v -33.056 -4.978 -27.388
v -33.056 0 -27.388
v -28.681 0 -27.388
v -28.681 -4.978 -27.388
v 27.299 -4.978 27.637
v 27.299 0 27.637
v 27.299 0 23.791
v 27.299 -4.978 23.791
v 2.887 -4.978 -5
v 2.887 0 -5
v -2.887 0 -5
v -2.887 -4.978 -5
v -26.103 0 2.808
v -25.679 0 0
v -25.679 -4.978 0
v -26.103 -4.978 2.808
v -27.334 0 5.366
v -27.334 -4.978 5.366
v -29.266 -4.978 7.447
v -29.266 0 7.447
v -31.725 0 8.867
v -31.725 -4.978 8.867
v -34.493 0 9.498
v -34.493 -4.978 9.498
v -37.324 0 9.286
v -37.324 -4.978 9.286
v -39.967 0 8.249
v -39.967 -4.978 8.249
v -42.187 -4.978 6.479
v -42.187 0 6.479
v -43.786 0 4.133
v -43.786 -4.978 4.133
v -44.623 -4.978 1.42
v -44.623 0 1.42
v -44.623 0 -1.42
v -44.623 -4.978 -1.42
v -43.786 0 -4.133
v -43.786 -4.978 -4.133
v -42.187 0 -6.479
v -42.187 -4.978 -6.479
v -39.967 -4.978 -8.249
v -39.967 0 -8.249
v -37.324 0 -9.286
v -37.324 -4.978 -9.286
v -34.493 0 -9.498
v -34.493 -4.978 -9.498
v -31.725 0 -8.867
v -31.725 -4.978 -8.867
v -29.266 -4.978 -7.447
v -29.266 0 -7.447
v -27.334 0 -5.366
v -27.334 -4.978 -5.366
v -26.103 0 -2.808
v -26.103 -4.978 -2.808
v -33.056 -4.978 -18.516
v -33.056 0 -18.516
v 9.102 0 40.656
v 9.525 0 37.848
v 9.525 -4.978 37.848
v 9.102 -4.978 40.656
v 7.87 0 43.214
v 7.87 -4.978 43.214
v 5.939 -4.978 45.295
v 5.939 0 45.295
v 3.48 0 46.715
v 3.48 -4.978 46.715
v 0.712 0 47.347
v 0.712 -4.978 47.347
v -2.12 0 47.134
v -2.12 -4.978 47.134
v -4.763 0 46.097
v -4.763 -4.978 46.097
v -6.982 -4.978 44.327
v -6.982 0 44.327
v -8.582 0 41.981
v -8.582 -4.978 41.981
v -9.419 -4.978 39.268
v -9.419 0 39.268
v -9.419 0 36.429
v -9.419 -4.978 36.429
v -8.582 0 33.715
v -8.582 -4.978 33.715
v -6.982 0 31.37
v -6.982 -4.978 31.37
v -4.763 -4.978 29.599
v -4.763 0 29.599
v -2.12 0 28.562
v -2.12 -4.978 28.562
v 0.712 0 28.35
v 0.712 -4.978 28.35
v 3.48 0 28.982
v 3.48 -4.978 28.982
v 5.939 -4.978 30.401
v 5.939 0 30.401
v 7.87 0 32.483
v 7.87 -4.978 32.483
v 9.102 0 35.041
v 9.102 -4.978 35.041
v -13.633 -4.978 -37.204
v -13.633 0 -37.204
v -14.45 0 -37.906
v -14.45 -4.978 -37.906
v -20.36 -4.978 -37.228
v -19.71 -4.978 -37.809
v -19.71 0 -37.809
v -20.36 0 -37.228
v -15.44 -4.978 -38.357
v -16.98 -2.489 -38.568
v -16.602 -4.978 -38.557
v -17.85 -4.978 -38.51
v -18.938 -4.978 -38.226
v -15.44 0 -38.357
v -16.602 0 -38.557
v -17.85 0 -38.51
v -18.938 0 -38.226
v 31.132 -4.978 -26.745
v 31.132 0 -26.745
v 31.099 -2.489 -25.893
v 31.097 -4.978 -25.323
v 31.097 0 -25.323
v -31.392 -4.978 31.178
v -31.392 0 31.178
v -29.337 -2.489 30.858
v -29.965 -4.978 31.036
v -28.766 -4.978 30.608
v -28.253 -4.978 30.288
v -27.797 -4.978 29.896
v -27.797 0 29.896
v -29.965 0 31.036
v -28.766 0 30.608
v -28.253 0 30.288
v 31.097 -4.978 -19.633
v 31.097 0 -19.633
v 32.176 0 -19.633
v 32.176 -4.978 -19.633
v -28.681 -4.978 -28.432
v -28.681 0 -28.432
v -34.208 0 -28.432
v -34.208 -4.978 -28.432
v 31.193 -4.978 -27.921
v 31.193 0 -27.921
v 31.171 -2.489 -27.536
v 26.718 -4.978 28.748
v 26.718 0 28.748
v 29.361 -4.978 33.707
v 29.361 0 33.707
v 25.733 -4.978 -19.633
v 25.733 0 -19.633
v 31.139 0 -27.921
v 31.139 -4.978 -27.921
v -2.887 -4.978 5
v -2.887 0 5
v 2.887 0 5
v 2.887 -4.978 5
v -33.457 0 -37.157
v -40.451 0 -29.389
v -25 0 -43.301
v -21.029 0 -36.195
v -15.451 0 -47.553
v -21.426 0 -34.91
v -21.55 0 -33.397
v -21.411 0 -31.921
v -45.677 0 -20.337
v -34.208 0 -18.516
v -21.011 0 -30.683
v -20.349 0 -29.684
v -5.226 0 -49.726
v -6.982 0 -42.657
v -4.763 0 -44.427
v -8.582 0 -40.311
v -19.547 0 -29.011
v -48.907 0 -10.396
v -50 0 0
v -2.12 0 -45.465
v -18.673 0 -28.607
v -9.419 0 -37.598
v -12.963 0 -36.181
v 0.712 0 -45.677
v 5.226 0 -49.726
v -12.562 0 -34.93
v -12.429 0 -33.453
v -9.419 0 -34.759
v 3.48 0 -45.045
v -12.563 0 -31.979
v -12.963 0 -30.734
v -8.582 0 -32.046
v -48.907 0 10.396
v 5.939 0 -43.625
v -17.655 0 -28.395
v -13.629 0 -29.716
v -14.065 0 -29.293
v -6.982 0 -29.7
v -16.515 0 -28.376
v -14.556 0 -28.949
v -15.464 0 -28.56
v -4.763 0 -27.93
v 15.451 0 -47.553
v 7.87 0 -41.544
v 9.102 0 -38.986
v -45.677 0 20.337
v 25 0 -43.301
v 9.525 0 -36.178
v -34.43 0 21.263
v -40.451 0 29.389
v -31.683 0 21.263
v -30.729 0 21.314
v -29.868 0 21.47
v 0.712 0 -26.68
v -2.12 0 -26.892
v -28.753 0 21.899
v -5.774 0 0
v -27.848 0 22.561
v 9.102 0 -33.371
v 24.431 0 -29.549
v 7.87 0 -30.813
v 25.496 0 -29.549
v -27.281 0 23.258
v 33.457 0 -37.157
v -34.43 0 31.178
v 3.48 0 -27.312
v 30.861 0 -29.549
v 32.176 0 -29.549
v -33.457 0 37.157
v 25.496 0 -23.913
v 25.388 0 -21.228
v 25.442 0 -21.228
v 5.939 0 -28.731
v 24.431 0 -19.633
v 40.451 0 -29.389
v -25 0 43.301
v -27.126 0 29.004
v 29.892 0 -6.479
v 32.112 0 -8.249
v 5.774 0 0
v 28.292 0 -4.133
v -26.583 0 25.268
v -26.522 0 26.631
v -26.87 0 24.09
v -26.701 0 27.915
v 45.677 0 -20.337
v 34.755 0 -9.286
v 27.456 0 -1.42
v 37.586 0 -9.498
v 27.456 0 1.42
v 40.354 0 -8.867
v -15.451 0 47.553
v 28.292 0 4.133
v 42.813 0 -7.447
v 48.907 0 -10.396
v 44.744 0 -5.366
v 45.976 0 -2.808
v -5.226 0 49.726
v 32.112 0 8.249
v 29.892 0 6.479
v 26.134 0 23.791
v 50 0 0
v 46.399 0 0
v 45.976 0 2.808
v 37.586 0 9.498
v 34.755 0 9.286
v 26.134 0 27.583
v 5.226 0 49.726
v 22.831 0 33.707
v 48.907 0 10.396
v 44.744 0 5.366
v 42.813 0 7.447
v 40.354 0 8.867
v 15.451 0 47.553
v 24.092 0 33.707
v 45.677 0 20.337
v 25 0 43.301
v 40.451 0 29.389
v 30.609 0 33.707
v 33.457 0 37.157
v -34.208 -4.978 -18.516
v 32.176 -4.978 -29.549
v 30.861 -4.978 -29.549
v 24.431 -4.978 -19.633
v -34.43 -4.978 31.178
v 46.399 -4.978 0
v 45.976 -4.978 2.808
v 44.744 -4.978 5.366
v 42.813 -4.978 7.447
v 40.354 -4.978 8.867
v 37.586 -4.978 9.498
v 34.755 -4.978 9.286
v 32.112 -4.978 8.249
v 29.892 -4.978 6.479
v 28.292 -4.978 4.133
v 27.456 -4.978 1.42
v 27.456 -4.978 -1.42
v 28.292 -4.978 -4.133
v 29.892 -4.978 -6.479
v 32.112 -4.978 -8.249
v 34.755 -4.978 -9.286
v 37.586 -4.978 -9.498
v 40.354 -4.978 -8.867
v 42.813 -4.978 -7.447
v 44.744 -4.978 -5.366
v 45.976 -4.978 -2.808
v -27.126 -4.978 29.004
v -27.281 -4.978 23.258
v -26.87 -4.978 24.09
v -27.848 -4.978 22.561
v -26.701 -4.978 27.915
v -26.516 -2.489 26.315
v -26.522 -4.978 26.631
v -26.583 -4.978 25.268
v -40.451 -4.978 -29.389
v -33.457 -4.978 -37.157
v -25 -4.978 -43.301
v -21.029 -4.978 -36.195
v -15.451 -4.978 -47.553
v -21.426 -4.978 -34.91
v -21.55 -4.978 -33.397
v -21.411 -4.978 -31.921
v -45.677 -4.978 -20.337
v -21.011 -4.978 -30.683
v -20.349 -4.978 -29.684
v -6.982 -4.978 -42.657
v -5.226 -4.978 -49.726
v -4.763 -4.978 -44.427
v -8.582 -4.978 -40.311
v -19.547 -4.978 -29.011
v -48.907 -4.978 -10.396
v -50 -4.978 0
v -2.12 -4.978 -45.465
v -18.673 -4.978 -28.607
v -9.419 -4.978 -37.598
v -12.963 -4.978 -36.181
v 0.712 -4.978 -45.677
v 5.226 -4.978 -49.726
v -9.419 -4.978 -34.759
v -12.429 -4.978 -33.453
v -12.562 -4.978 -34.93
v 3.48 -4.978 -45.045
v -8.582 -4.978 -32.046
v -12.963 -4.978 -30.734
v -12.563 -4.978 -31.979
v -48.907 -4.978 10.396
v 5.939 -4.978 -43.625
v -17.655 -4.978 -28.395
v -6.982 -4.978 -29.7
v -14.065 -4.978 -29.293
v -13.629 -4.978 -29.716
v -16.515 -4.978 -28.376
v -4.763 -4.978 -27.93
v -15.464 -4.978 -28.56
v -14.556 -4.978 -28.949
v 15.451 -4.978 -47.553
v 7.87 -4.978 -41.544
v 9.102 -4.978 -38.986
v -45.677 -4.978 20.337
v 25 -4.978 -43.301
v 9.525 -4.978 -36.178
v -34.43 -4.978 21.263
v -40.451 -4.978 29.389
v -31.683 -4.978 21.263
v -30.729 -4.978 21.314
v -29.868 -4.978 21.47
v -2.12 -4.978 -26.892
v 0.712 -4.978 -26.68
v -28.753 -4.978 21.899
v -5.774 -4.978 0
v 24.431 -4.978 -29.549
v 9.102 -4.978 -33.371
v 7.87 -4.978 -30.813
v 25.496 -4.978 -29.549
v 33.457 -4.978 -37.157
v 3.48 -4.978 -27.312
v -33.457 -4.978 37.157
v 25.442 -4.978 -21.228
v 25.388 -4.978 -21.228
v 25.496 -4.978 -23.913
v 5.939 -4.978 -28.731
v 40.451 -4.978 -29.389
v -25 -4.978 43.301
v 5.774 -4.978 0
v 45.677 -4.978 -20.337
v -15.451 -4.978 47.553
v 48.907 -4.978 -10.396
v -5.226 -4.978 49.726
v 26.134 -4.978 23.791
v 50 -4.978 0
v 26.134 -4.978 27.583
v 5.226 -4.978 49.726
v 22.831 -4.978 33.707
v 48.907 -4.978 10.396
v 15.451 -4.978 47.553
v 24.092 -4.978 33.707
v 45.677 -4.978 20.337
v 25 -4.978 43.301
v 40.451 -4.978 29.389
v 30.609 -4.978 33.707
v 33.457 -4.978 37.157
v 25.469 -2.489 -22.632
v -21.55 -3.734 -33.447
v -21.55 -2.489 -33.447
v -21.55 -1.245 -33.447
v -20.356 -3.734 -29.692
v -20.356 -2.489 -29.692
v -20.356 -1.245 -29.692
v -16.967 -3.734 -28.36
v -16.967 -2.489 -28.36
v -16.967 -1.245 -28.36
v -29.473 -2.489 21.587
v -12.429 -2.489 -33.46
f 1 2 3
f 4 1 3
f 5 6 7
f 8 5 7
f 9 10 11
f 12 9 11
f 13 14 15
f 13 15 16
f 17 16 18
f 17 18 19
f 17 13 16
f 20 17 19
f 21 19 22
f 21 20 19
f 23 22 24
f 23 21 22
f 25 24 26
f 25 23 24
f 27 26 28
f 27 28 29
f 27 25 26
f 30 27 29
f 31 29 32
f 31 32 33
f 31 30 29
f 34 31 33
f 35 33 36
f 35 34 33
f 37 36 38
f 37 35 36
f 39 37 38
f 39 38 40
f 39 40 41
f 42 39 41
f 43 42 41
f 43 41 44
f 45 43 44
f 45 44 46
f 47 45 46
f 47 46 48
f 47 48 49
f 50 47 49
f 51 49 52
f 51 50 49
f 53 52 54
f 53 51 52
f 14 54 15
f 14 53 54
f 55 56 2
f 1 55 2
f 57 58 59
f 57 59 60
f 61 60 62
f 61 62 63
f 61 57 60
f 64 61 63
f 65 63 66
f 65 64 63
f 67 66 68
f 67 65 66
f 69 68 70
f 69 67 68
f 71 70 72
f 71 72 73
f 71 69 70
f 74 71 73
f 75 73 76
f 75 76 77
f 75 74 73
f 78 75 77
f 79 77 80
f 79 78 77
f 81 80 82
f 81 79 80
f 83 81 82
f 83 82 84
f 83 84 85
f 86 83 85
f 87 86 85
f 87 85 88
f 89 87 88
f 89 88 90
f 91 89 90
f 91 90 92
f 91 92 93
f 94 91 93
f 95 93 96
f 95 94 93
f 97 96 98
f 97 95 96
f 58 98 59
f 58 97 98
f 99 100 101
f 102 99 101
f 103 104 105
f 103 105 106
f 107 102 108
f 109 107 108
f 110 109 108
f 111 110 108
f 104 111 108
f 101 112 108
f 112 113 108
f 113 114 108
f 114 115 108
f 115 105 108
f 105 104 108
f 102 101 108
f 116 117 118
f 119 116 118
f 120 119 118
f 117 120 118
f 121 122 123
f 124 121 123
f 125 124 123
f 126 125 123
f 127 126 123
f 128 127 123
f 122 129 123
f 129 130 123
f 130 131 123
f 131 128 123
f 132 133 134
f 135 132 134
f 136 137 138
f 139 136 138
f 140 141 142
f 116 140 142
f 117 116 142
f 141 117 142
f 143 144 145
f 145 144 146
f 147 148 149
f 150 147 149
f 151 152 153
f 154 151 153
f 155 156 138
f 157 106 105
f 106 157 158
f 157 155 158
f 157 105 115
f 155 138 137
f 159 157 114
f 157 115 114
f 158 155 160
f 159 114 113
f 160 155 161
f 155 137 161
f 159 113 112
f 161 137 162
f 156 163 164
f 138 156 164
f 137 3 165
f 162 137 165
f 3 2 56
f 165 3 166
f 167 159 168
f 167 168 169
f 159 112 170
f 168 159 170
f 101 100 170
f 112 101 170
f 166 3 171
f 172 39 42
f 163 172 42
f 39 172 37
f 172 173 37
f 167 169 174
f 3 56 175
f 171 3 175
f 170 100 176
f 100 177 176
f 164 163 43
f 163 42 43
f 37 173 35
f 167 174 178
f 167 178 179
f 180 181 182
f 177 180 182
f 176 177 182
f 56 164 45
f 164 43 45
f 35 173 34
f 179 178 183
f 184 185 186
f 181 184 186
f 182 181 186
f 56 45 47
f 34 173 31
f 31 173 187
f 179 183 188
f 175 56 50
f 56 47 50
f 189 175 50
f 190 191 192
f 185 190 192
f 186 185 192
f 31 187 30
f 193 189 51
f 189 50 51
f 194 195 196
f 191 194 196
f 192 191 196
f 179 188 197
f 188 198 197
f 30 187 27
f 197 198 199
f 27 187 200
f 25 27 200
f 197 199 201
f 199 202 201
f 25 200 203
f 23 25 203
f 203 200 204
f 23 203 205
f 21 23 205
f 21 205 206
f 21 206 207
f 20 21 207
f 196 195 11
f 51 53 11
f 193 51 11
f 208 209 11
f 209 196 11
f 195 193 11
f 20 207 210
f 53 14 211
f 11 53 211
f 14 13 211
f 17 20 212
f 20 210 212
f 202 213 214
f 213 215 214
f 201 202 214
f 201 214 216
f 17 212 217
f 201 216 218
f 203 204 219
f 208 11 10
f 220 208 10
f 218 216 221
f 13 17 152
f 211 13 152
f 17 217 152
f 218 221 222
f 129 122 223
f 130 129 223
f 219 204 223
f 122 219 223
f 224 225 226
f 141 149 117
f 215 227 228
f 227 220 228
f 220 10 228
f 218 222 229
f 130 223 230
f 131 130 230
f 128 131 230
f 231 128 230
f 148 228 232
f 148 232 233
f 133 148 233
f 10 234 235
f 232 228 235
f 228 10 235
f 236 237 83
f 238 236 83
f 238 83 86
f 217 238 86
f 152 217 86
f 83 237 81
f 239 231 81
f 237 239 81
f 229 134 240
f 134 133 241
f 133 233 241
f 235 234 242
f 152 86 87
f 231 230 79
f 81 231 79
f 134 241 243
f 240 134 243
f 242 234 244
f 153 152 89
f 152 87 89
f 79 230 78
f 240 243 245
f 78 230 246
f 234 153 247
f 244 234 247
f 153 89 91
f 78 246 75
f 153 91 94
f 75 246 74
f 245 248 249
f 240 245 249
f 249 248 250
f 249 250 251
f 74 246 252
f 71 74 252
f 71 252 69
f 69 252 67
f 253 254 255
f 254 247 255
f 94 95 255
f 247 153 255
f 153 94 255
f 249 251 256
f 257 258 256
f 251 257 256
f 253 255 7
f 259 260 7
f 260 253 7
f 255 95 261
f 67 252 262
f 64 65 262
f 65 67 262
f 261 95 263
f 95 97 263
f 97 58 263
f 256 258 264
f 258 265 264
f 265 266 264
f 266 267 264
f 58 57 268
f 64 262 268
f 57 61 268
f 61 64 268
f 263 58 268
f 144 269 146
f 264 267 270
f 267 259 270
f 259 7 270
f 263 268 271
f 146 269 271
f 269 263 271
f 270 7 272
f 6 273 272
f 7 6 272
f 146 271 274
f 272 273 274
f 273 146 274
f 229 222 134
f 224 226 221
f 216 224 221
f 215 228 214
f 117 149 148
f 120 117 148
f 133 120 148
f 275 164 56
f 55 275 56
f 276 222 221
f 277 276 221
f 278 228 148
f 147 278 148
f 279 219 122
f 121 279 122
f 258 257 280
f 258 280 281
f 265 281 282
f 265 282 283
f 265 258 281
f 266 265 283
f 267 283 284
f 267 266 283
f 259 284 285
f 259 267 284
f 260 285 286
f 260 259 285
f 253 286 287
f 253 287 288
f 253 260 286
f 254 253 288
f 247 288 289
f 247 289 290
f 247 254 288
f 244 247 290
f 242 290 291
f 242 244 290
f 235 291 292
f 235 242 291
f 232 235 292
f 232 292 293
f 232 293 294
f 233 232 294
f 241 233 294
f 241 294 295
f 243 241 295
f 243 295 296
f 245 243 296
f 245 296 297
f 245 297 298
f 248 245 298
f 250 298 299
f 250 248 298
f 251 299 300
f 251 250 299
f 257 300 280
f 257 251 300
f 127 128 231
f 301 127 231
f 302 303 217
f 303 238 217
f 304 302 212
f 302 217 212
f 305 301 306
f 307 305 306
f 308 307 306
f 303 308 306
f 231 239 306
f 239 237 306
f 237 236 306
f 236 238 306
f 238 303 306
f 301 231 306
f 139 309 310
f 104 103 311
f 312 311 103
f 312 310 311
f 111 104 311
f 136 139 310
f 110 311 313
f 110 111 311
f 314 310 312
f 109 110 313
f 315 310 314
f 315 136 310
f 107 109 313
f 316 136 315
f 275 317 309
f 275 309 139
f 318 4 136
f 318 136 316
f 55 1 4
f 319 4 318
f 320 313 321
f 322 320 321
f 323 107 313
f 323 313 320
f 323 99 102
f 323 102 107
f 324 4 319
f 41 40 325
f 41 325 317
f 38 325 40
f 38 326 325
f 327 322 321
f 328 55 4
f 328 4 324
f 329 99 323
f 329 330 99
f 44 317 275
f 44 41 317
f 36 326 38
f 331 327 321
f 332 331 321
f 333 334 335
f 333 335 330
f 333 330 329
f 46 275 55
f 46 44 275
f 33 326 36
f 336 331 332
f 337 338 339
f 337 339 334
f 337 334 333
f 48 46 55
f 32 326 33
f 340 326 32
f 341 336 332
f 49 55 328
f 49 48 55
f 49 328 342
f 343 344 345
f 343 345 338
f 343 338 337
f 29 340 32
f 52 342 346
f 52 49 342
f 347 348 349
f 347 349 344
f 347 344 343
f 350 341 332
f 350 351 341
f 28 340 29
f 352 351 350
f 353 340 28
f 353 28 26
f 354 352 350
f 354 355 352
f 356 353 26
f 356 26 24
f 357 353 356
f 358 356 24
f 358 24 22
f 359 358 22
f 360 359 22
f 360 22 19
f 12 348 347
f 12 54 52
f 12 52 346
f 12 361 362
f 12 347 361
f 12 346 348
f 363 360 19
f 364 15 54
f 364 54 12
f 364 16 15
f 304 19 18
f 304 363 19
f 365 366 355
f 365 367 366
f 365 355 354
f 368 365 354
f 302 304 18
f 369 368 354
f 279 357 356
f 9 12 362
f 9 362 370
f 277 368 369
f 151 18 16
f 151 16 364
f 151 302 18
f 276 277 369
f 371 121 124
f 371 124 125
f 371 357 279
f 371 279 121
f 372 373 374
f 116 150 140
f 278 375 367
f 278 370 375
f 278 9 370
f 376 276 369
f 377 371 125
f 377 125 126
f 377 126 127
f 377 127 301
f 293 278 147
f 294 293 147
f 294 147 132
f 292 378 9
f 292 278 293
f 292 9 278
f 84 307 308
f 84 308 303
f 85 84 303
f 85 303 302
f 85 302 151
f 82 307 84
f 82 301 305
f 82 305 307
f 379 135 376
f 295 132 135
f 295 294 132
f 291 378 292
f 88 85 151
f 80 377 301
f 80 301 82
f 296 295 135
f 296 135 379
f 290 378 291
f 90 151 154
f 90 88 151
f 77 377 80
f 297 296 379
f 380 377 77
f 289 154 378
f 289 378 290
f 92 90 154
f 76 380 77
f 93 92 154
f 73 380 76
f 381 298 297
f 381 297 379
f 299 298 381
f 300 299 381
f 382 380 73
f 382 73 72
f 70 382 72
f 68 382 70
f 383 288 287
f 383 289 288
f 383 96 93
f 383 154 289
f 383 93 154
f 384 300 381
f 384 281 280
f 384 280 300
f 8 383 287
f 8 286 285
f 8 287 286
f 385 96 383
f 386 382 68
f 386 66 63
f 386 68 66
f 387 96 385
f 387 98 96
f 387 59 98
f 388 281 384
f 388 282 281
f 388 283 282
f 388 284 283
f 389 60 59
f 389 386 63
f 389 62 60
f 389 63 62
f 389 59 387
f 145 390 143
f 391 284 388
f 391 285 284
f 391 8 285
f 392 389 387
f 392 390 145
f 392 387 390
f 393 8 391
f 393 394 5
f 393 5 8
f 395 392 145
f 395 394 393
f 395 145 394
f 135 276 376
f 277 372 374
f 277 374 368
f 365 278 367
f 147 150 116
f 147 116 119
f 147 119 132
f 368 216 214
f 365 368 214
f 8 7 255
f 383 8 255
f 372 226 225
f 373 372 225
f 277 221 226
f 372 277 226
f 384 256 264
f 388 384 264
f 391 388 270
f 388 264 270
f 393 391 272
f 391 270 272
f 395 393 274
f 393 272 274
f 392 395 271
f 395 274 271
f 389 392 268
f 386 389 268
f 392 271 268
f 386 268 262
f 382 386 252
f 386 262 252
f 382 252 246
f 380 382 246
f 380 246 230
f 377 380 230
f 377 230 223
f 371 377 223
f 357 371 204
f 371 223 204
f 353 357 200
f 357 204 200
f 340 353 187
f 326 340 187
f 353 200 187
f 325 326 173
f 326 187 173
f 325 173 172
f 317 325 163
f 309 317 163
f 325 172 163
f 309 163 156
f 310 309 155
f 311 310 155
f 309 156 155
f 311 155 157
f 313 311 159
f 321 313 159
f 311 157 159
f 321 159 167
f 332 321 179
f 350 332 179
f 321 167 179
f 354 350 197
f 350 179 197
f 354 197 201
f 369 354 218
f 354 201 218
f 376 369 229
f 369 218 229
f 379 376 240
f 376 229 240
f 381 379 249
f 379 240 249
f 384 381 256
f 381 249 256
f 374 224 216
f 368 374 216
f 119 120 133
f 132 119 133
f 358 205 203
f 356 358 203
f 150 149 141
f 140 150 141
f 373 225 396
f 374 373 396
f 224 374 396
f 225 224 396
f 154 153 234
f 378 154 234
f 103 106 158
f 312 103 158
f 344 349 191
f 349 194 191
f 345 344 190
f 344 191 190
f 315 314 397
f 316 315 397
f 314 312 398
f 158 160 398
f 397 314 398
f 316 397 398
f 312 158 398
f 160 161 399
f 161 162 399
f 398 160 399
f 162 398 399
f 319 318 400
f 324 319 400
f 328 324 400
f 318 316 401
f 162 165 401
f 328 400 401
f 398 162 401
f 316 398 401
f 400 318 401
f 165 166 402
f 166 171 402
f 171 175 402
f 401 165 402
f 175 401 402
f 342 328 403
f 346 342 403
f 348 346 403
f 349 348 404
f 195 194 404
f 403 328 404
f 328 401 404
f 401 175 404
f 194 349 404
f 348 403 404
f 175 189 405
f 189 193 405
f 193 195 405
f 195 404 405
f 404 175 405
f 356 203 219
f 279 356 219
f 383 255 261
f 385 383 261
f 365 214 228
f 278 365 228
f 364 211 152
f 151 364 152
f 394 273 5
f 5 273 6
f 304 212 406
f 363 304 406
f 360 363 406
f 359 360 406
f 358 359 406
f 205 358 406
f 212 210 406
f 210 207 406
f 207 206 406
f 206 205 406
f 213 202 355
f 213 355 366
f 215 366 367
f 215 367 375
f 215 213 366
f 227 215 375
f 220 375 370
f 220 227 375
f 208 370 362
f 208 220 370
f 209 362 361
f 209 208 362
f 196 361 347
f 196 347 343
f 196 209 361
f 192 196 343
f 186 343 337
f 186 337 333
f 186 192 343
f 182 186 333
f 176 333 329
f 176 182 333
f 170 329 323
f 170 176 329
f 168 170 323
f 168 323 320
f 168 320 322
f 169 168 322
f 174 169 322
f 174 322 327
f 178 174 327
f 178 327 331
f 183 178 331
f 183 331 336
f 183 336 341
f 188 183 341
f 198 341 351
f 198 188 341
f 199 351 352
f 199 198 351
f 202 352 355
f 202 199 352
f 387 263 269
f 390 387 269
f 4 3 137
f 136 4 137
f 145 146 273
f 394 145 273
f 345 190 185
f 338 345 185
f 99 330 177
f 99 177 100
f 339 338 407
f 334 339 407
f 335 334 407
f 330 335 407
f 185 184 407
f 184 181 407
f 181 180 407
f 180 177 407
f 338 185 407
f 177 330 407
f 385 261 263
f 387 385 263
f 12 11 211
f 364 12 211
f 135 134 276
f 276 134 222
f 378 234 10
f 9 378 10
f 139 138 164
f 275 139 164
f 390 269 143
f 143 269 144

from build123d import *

# Parameters (mm, degrees)
F0_R     = 50
F0_R_2   = 9.525
F1_DEPTH = 4.9784


with BuildPart() as f1:
    # F0 (on Front) → F1 (new body)
    with BuildSketch(Plane.XZ):
        Circle(F0_R)
        with BuildLine():
            add(Edge.make_bspline(
                [(-13.6288838135, -29.7163466199), (-12.4287970079, -31.0726834254), (-12.4287970079, -33.4598362032)],
                knots=[0, 0, 0, 1, 1, 1], degree=2))
            add(Edge.make_bspline(
                [(-12.4287970079, -33.4598362032), (-12.4287970079, -35.8404785643), (-13.6332240912, -37.204410856)],
                knots=[0, 0, 0, 1, 1, 1], degree=2))
            add(Edge.make_bspline(
                [(-13.6332240912, -37.204410856), (-14.8376511746, -38.5683431476), (-16.9795782579, -38.5683431476)],
                knots=[0, 0, 0, 1, 1, 1], degree=2))
            add(Edge.make_bspline(
                [(-16.9795782579, -38.5683431476), (-19.1692483968, -38.5683431476), (-20.3595695774, -37.2282823837)],
                knots=[0, 0, 0, 1, 1, 1], degree=2))
            add(Edge.make_bspline(
                [(-20.3595695774, -37.2282823837), (-21.5498907579, -35.8882216199), (-21.5498907579, -33.4468153699)],
                knots=[0, 0, 0, 1, 1, 1], degree=2))
            add(Edge.make_bspline(
                [(-21.5498907579, -33.4468153699), (-21.5498907579, -31.0249403699), (-20.356314369, -29.6924750921)],
                knots=[0, 0, 0, 1, 1, 1], degree=2))
            add(Edge.make_bspline(
                [(-20.356314369, -29.6924750921), (-19.1627379801, -28.3600098143), (-16.9665574246, -28.3600098143)],
                knots=[0, 0, 0, 1, 1, 1], degree=2))
            add(Edge.make_bspline(
                [(-16.9665574246, -28.3600098143), (-14.828970619, -28.3600098143), (-13.6288838135, -29.7163466199)],
                knots=[0, 0, 0, 1, 1, 1], degree=2))
        make_face(mode=Mode.SUBTRACT)
        Polygon((-28.6808658119, -28.4316243976), (-34.2082095619, -28.4316243976), (-34.2082095619, -18.5162598143), (-33.0558658119, -18.5162598143), (-33.0558658119, -27.3877875921), (-28.6808658119, -27.3877875921), align=None, mode=Mode.SUBTRACT)
        with Locations((0, -36.1784361303)):
            Circle(F0_R_2, mode=Mode.SUBTRACT)
        with BuildLine():
            Line((32.1758840849, -19.6333272258), (32.1758840849, -29.5486918092))
            Line((32.1758840849, -29.5486918092), (30.8607799182, -29.5486918092))
            Line((30.8607799182, -29.5486918092), (25.4419431127, -21.2283793092))
            Line((25.4419431127, -21.2283793092), (25.3876896404, -21.2283793092))
            add(Edge.make_bspline(
                [(25.3876896404, -21.2283793092), (25.4961965849, -22.6932230592), (25.4961965849, -23.9128411147)],
                knots=[0, 0, 0, 1, 1, 1], degree=2))
            Line((25.4961965849, -23.9128411147), (25.4961965849, -29.5486918092))
            Line((25.4961965849, -29.5486918092), (24.4306583904, -29.5486918092))
            Line((24.4306583904, -29.5486918092), (24.4306583904, -19.6333272258))
            Line((24.4306583904, -19.6333272258), (25.7327417238, -19.6333272258))
            Line((25.7327417238, -19.6333272258), (31.138557696, -27.9210876425))
            Line((31.138557696, -27.9210876425), (31.1928111682, -27.9210876425))
            add(Edge.make_bspline(
                [(31.1928111682, -27.9210876425), (31.1797903349, -27.7387959758), (31.1320472793, -26.7448723647)],
                knots=[0, 0, 0, 1, 1, 1], degree=2))
            add(Edge.make_bspline(
                [(31.1320472793, -26.7448723647), (31.0843042238, -25.7509487536), (31.0973250571, -25.3234313925)],
                knots=[0, 0, 0, 1, 1, 1], degree=2))
            Line((31.0973250571, -25.3234313925), (31.0973250571, -19.6333272258))
            Line((31.0973250571, -19.6333272258), (32.1758840849, -19.6333272258))
        make_face(mode=Mode.SUBTRACT)
        with Locations((-35.2043993771, 0)):
            Circle(F0_R_2, mode=Mode.SUBTRACT)
        with BuildLine():
            add(Edge.make_bspline(
                [(-27.7972958, 29.8964257207), (-26.5158287861, 28.6149587068), (-26.5158287861, 26.3146114846)],
                knots=[0, 0, 0, 1, 1, 1], degree=2))
            add(Edge.make_bspline(
                [(-26.5158287861, 26.3146114846), (-26.5158287861, 23.8601844013), (-27.8482940638, 22.5613562763)],
                knots=[0, 0, 0, 1, 1, 1], degree=2))
            add(Edge.make_bspline(
                [(-27.8482940638, 22.5613562763), (-29.1807593416, 21.2625281513), (-31.6829294805, 21.2625281513)],
                knots=[0, 0, 0, 1, 1, 1], degree=2))
            Line((-31.6829294805, 21.2625281513), (-34.4303253138, 21.2625281513))
            Line((-34.4303253138, 21.2625281513), (-34.4303253138, 31.1778927346))
            Line((-34.4303253138, 31.1778927346), (-31.3921308694, 31.1778927346))
            add(Edge.make_bspline(
                [(-31.3921308694, 31.1778927346), (-29.0787628138, 31.1778927346), (-27.7972958, 29.8964257207)],
                knots=[0, 0, 0, 1, 1, 1], degree=2))
        make_face(mode=Mode.SUBTRACT)
        Polygon((-5.7735026919, 0), (-2.8867513459, 5), (2.8867513459, 5), (5.7735026919, 0), (2.8867513459, -5), (-2.8867513459, -5), align=None, mode=Mode.SUBTRACT)
        with Locations((36.8741750717, 0)):
            Circle(F0_R_2, mode=Mode.SUBTRACT)
        with Locations((0, 37.8482080996)):
            Circle(F0_R_2, mode=Mode.SUBTRACT)
        Polygon((24.0917380744, 33.7066756686), (26.7176061299, 28.7479083074), (29.3608352966, 33.7066756686), (30.6086651577, 33.7066756686), (27.2992033522, 27.6367971963), (27.2992033522, 23.7913110852), (26.1338387688, 23.7913110852), (26.1338387688, 27.5825437241), (22.8308873799, 33.7066756686), align=None, mode=Mode.SUBTRACT)
    extrude(amount=F1_DEPTH)


solid = f1.part
